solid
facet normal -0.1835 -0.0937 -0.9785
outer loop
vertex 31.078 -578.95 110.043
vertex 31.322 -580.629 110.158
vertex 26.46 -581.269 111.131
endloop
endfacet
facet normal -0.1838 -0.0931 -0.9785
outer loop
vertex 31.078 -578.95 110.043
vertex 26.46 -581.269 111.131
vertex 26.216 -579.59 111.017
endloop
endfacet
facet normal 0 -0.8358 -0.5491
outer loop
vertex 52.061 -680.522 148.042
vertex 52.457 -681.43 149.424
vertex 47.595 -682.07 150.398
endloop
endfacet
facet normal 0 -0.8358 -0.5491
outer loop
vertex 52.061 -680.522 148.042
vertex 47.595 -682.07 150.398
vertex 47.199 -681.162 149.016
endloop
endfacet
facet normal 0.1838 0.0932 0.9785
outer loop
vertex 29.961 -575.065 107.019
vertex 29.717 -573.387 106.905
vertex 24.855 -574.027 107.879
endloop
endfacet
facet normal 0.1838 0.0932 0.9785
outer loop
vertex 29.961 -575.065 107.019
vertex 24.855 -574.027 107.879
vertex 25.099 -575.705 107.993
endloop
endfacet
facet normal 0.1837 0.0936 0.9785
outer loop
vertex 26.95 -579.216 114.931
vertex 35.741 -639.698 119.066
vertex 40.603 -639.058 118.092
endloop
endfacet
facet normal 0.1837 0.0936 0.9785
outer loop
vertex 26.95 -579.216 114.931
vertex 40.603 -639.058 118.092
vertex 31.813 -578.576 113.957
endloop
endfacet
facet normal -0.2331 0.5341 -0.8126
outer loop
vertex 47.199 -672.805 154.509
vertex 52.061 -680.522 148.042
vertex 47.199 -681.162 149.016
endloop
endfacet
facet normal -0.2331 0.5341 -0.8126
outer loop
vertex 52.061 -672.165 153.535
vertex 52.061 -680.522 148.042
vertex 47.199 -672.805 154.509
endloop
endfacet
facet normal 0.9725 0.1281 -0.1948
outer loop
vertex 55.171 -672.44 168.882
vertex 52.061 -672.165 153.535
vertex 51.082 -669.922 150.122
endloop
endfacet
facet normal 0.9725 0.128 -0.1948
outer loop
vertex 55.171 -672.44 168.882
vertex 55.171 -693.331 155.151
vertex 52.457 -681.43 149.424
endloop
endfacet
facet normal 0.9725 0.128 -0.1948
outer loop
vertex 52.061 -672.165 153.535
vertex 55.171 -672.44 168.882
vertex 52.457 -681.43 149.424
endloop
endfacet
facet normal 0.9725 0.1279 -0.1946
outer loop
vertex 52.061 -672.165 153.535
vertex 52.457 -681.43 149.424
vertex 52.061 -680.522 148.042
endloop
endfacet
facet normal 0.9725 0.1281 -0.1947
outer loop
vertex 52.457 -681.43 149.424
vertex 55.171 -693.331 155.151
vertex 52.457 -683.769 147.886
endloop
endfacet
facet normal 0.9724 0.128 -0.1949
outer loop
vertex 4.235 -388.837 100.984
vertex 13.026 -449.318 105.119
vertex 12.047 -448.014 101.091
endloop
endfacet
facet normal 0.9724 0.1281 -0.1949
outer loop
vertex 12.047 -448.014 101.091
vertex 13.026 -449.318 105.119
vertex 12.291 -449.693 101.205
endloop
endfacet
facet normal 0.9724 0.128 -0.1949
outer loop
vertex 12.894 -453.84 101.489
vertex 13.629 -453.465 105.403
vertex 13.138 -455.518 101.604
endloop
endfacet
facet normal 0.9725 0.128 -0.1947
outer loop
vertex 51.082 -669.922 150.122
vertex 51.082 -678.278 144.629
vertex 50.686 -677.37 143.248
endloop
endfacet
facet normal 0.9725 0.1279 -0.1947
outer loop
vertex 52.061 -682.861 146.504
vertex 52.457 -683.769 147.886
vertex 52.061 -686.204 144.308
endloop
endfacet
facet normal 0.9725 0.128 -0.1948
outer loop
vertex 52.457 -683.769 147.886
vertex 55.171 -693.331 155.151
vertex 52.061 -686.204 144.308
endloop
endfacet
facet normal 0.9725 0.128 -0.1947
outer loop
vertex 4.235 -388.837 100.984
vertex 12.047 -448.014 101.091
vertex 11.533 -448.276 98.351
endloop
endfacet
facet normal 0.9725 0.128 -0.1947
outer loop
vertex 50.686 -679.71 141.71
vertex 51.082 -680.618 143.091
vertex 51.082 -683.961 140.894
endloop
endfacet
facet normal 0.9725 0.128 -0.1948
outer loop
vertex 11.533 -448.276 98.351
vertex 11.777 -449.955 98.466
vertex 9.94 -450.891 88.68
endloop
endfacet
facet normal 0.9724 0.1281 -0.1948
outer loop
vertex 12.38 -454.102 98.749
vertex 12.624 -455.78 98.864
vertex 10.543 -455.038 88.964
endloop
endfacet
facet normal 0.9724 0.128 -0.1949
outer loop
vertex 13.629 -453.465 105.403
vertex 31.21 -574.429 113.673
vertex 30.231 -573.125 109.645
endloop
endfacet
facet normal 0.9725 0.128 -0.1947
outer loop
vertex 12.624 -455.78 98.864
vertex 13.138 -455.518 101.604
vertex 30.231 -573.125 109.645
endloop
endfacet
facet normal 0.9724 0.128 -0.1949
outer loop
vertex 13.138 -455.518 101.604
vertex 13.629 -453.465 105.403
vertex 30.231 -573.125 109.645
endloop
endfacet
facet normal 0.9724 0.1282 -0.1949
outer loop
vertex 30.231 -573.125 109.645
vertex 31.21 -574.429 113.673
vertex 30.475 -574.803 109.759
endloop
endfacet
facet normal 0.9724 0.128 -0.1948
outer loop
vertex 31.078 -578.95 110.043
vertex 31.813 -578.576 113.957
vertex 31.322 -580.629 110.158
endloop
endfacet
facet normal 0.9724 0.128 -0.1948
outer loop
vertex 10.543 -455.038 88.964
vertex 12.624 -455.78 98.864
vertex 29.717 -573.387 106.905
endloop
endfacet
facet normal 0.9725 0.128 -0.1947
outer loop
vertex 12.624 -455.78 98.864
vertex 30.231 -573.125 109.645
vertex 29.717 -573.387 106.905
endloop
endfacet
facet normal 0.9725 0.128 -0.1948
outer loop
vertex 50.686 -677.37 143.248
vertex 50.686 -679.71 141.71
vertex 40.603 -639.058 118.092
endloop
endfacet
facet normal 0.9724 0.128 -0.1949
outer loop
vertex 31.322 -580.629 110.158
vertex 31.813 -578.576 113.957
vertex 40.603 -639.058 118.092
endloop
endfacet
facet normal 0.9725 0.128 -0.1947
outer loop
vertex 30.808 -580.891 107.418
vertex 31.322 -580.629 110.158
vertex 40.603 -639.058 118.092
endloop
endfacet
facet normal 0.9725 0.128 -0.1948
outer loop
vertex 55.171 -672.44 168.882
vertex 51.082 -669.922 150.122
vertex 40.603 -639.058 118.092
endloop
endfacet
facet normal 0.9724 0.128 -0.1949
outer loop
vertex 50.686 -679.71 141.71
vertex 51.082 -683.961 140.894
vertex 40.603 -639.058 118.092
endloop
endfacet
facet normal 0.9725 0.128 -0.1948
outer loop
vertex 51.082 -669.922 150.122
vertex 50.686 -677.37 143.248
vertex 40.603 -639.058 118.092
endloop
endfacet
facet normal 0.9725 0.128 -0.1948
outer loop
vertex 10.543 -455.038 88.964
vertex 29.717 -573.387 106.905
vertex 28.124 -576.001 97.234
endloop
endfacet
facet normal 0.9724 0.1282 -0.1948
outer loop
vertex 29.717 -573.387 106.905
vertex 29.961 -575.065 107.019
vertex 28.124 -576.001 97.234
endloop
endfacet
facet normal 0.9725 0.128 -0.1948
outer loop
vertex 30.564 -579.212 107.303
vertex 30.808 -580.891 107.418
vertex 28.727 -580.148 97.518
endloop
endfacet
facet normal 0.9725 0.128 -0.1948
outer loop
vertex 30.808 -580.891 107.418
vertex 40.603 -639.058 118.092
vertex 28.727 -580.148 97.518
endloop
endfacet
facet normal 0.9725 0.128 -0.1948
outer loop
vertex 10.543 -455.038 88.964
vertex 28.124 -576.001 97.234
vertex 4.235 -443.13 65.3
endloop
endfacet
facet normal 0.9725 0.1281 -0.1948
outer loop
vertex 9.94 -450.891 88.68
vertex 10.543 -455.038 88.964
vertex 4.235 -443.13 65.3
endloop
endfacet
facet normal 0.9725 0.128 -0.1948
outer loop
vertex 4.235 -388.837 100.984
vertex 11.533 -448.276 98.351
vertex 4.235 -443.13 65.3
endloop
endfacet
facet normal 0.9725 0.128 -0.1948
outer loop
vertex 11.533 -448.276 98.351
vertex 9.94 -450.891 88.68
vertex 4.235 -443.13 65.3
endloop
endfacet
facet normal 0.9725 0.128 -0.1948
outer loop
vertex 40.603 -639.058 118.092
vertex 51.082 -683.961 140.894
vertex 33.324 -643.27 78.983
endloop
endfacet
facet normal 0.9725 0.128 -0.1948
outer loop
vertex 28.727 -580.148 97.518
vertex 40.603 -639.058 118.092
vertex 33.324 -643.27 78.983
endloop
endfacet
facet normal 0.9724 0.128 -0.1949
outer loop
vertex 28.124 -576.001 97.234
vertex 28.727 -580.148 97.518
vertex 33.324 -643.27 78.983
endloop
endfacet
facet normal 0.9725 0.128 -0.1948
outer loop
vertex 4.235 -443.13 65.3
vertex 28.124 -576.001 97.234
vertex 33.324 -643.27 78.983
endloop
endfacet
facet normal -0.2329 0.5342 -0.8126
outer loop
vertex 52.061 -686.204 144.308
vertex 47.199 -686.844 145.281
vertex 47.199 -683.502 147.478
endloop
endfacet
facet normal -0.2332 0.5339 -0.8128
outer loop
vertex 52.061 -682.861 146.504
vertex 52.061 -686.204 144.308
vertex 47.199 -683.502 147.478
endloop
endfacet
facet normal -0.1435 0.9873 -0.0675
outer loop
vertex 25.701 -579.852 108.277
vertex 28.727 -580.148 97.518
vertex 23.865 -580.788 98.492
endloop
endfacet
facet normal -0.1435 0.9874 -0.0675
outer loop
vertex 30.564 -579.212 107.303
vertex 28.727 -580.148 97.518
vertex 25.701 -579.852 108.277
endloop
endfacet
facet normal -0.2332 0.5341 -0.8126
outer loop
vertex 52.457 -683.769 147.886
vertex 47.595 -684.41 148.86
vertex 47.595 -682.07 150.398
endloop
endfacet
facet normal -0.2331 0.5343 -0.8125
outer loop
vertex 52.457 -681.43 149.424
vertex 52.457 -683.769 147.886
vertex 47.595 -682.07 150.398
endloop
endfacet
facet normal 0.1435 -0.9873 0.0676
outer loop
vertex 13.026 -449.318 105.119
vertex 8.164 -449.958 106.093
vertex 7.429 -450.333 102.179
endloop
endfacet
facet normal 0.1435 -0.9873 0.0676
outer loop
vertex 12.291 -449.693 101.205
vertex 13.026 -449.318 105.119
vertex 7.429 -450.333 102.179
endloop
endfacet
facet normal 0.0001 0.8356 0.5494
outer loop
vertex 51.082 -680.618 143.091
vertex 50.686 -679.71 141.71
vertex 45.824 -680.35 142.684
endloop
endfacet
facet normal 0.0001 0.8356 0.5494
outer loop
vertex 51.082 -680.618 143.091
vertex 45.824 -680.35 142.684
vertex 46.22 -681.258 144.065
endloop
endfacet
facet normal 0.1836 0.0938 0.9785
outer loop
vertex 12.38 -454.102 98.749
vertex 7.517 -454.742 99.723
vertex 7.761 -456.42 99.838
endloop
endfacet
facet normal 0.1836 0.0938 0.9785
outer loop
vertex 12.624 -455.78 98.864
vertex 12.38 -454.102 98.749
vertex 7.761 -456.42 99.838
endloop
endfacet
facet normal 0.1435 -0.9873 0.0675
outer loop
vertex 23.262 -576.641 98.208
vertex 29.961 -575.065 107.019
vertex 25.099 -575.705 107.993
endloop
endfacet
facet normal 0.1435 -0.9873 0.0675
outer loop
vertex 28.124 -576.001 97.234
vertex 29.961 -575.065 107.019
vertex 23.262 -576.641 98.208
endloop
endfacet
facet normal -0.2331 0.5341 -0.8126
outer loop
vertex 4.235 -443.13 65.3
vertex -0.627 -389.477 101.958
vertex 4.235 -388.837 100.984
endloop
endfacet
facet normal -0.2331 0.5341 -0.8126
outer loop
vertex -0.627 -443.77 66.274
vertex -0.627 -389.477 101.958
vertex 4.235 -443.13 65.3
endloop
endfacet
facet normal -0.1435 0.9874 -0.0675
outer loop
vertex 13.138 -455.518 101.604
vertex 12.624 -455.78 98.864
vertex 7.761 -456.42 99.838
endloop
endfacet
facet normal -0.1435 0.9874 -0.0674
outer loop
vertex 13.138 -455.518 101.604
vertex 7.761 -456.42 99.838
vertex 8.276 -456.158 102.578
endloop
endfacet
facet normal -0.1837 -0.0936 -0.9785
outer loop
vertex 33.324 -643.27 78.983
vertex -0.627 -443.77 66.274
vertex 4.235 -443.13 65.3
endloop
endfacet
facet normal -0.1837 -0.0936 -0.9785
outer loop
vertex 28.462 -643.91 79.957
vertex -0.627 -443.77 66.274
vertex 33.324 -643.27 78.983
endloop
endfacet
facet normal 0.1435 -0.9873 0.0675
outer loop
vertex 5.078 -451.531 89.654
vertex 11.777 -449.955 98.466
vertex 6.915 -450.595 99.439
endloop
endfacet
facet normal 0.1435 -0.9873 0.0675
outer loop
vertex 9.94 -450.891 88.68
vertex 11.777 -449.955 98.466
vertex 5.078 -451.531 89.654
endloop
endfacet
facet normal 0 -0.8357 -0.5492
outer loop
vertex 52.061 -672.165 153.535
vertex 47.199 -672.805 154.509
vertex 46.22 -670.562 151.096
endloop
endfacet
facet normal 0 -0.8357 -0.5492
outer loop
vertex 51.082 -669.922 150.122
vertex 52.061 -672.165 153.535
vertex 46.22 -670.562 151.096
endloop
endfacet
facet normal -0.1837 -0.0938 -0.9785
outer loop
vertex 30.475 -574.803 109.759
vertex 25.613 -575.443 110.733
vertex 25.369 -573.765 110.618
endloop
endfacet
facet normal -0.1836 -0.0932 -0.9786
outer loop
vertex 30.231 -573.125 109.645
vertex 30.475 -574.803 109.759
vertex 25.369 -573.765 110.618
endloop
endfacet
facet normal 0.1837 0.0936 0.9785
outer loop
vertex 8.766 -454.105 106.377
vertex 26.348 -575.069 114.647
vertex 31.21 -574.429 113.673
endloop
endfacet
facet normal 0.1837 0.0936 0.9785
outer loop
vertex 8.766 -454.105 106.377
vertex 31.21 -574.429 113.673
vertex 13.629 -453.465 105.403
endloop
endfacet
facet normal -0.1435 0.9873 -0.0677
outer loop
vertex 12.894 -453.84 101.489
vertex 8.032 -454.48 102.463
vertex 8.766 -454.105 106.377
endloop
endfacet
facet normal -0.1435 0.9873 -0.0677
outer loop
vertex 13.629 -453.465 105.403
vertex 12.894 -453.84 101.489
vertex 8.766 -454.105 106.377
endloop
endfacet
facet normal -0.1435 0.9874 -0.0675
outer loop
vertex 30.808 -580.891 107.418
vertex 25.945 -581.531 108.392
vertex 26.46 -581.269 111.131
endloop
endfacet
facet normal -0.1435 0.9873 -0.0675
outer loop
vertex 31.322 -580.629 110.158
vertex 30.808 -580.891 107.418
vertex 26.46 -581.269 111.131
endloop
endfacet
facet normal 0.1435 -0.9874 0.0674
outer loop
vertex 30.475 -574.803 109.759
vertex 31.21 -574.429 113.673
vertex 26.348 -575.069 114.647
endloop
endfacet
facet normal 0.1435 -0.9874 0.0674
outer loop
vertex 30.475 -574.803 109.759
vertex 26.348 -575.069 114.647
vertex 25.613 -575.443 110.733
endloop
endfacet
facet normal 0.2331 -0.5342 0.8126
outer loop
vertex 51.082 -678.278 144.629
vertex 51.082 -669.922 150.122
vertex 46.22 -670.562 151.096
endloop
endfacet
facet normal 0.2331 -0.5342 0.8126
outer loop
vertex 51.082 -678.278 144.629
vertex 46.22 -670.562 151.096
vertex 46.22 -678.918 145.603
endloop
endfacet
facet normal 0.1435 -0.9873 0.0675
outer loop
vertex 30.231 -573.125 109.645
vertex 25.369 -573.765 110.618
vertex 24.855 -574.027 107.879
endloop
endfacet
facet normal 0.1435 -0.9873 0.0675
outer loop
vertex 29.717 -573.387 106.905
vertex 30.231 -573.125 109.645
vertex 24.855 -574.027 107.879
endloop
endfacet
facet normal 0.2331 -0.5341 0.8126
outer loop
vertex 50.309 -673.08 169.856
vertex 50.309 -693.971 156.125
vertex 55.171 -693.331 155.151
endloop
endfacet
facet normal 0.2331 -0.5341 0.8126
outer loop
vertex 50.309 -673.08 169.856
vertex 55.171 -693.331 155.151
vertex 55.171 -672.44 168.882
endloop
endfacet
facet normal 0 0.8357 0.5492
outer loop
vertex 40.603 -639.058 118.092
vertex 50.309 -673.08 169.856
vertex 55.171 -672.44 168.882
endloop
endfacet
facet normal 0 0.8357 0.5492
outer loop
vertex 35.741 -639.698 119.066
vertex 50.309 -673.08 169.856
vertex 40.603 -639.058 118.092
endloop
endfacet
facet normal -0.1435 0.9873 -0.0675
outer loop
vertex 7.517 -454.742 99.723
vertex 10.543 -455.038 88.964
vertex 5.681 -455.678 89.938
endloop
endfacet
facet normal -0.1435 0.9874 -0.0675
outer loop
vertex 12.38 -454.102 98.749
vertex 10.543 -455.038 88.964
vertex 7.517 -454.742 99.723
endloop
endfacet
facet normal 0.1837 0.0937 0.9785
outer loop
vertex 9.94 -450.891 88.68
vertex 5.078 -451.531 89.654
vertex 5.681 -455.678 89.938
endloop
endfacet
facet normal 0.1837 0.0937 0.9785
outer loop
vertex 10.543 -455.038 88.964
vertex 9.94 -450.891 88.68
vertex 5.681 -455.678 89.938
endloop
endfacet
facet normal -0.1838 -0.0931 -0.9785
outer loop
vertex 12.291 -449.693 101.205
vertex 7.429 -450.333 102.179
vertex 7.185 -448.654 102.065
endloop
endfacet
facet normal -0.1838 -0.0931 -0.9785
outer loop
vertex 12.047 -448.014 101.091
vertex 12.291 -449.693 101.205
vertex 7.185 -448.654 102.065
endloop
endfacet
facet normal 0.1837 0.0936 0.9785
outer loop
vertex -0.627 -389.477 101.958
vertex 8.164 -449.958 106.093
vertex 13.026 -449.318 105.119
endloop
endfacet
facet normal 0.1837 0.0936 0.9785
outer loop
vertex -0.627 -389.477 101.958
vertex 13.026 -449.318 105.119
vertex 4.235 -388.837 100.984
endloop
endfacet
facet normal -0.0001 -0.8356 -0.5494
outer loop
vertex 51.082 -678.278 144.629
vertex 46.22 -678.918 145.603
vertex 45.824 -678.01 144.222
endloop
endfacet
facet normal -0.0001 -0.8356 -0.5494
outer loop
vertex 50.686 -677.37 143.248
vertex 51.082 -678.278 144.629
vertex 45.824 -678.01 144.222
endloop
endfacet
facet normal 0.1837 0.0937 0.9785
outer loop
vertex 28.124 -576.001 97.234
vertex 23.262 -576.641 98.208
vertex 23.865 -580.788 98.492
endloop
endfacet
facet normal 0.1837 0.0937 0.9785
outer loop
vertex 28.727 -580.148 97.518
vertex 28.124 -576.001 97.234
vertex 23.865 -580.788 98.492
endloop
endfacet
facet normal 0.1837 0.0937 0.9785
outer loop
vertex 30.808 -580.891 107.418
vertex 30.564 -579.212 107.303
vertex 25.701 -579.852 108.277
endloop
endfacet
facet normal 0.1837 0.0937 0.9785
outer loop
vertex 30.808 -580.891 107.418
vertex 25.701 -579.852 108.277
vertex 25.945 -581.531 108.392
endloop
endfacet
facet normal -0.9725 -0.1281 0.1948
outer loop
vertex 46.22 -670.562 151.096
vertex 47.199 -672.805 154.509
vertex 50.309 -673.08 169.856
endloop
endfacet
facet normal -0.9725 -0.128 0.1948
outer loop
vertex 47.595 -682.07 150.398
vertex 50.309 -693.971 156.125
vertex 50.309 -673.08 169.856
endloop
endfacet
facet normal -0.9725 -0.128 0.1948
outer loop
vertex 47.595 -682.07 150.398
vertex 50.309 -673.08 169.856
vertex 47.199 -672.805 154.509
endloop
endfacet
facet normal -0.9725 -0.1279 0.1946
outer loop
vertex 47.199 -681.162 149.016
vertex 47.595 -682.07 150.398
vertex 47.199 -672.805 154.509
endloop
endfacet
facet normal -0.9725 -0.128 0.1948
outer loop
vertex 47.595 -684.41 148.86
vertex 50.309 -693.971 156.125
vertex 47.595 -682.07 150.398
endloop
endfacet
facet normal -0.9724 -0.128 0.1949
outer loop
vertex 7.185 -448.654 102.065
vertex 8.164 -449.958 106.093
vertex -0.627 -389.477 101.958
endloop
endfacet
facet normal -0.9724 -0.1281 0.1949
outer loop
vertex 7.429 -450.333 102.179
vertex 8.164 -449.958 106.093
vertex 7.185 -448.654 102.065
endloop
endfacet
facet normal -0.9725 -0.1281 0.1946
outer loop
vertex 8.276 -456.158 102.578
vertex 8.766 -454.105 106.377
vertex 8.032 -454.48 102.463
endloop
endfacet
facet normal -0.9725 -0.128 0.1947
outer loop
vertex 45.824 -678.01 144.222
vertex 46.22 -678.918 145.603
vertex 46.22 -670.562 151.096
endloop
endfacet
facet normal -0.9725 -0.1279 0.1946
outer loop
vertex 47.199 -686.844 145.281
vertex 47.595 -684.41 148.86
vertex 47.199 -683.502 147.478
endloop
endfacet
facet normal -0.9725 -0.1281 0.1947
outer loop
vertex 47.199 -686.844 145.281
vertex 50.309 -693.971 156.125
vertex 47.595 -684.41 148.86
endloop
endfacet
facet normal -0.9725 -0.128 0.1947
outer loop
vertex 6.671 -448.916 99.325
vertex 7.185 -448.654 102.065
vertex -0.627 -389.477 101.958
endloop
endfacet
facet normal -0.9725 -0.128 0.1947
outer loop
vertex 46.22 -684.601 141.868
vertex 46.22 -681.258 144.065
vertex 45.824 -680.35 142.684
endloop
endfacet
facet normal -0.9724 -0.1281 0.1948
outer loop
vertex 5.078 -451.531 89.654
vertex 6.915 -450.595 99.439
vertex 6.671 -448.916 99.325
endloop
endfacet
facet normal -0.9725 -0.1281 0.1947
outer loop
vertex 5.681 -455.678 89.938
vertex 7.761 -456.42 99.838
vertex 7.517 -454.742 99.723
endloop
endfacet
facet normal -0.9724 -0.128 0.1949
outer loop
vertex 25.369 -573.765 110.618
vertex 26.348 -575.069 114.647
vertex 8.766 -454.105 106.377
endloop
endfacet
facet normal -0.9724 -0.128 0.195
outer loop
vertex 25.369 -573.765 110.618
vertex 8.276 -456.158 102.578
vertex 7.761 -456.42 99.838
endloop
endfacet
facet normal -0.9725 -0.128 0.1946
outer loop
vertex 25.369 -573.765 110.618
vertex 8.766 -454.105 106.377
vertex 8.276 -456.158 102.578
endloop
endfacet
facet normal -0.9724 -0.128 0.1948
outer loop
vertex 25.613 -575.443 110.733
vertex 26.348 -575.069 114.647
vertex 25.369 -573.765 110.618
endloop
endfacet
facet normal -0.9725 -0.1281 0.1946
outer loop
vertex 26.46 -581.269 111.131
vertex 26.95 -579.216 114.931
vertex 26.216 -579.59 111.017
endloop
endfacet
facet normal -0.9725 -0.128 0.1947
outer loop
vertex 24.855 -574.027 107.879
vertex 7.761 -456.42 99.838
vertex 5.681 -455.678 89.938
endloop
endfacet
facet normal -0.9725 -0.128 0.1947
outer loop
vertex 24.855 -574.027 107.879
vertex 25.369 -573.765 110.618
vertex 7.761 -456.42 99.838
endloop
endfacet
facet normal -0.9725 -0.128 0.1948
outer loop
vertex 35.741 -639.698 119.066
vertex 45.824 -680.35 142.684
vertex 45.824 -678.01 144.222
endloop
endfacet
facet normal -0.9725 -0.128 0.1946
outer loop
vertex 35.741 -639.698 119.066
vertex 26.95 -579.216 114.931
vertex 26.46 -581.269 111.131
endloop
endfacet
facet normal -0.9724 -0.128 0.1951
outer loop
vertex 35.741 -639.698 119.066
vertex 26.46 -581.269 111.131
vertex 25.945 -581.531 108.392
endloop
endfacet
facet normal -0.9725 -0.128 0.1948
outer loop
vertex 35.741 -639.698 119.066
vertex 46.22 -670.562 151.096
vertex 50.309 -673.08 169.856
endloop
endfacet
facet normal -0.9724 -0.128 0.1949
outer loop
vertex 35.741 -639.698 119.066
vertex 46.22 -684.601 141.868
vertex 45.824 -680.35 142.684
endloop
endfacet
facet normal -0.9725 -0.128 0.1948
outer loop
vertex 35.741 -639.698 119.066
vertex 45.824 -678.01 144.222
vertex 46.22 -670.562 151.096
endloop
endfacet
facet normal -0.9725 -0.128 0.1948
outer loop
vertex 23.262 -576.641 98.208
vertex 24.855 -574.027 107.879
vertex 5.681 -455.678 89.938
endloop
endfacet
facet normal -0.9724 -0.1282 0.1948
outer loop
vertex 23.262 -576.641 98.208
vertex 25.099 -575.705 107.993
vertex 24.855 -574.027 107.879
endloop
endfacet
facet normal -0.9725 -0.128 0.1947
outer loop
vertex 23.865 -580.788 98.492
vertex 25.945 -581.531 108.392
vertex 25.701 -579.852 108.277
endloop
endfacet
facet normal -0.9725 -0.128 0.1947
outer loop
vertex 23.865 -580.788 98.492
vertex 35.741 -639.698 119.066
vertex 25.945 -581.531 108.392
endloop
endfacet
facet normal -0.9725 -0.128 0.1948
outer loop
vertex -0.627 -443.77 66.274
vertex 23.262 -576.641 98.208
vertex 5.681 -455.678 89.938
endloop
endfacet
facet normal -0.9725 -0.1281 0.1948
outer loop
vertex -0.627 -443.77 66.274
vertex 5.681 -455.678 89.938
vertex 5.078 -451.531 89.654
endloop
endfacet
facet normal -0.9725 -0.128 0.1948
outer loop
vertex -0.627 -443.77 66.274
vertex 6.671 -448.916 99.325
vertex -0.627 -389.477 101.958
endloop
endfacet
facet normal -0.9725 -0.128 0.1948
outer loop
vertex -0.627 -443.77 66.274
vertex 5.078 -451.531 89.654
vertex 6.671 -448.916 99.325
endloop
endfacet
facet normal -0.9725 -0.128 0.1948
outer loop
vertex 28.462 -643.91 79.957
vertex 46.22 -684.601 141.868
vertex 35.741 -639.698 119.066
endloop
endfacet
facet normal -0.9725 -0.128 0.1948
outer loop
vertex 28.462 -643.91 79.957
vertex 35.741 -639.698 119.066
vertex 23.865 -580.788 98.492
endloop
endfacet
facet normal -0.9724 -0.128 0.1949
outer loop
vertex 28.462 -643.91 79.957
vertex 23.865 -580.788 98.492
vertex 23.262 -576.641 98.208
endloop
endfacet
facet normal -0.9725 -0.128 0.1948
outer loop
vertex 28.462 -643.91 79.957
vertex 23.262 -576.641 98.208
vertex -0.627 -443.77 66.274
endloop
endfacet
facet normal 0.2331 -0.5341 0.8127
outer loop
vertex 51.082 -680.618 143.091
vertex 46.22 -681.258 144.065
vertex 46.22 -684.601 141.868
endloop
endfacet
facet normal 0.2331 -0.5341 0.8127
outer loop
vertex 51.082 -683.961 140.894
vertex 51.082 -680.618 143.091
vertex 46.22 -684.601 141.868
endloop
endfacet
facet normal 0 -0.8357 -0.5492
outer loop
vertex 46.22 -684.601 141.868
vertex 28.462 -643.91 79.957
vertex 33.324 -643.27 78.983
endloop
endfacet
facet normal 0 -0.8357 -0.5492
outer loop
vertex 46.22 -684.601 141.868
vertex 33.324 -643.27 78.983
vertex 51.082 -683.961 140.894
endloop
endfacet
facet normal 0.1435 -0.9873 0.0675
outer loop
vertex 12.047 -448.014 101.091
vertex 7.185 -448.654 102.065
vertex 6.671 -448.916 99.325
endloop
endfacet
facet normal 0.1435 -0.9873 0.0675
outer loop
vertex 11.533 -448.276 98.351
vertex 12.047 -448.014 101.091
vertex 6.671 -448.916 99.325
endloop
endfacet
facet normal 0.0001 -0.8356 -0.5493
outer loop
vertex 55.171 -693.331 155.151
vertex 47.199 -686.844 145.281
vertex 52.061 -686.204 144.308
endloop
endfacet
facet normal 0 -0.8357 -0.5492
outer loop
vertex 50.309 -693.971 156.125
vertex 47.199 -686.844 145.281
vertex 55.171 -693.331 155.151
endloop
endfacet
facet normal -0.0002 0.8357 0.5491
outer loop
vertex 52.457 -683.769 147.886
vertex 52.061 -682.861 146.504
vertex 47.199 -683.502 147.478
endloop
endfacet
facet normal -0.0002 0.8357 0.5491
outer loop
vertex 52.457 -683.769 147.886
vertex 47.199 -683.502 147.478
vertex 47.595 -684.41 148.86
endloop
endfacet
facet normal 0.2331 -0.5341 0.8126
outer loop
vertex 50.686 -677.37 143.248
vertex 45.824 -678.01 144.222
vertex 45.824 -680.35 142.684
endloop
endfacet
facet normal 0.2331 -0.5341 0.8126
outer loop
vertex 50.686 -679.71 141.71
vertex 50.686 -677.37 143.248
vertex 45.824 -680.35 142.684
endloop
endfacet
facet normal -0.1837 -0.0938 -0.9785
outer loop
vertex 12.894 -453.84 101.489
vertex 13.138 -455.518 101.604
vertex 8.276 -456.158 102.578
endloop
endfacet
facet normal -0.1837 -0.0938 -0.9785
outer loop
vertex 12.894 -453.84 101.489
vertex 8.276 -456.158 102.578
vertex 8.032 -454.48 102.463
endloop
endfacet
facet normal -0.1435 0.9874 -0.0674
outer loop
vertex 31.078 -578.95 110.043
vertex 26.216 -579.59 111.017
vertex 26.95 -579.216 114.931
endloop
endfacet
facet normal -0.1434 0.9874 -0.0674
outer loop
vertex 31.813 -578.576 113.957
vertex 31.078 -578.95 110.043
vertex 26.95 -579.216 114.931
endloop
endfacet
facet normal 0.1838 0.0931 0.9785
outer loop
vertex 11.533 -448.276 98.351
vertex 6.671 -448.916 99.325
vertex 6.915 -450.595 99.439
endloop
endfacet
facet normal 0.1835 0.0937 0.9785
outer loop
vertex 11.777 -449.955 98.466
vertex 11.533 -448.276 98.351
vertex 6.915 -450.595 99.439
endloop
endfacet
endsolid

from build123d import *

# Parameters (mm, degrees)
BOSS_EXTRUDE1_DEPTH = 5
CUT_EXTRUDE2_DEPTH  = 714.328929729


with BuildPart() as part:
    # Sketch1 → Boss-Extrude1 (new body)
    with BuildSketch(Plane(origin=(-68.393987025, -9.003975274, 13.699403605), x_dir=(0.23308919144115517, -0.5341135383088325, 0.8126451605888809), z_dir=(0.972455360843524, 0.1280224242624249, -0.19478406005796045))):
        Polygon((290.734459145, 269.471566891), (290.734459145, 334.44233671), (415.531866377, 494.175733816), (509.260454317, 494.175733816), (509.260454317, 469.175733816), (446.760454317, 469.175733816), align=None)
    extrude(amount=BOSS_EXTRUDE1_DEPTH)

    # Sketch3 → Cut-Extrude2 (cut, through all)
    with BuildSketch(Plane(origin=(-63.53171022, -8.363863152, 12.725483305), x_dir=(-0.193117751863984, -0.025423689104136546, -0.9808461499885377), z_dir=(0.9724553608435241, 0.1280224242624253, -0.19478406005796034))):
        Polygon((-103.20824521, -577.778495346), (-102.919185311, -573.588454251), (-98.928669982, -573.863749393), (-98.811669547, -572.167780379), (-96.018308817, -572.360486979), (-96.135309253, -574.056455993), (-86.159020932, -574.74469385), (-86.448080832, -578.934734944), (-96.424369152, -578.246497088), (-96.541369588, -579.942466102), (-99.334730318, -579.749759503), (-99.217729882, -578.053790488), align=None)
        Polygon((-94.487300279, -451.364843062), (-94.19824038, -447.174801967), (-90.207725052, -447.45009711), (-90.090724616, -445.754128095), (-87.297363886, -445.946834695), (-87.414364322, -447.64280371), (-77.438076001, -448.331041566), (-77.727135901, -452.521082661), (-87.703424221, -451.832844804), (-87.820424657, -453.528813819), (-90.613785387, -453.336107219), (-90.496784951, -451.640138205), align=None)
        Polygon((-130.671777813, -684.777132582), (-134.151538298, -687.128997155), (-136.39140932, -683.81493955), (-137.799883802, -684.766884734), (-139.367793517, -682.447044411), (-137.959319035, -681.495099227), (-143.558996589, -673.209955215), (-140.079236104, -670.858090643), (-134.47955855, -679.143234654), (-133.071084068, -678.19128947), (-131.503174353, -680.511129793), (-132.911648835, -681.463074978), align=None)
    extrude(amount=-CUT_EXTRUDE2_DEPTH, mode=Mode.SUBTRACT)


solid = part.part
